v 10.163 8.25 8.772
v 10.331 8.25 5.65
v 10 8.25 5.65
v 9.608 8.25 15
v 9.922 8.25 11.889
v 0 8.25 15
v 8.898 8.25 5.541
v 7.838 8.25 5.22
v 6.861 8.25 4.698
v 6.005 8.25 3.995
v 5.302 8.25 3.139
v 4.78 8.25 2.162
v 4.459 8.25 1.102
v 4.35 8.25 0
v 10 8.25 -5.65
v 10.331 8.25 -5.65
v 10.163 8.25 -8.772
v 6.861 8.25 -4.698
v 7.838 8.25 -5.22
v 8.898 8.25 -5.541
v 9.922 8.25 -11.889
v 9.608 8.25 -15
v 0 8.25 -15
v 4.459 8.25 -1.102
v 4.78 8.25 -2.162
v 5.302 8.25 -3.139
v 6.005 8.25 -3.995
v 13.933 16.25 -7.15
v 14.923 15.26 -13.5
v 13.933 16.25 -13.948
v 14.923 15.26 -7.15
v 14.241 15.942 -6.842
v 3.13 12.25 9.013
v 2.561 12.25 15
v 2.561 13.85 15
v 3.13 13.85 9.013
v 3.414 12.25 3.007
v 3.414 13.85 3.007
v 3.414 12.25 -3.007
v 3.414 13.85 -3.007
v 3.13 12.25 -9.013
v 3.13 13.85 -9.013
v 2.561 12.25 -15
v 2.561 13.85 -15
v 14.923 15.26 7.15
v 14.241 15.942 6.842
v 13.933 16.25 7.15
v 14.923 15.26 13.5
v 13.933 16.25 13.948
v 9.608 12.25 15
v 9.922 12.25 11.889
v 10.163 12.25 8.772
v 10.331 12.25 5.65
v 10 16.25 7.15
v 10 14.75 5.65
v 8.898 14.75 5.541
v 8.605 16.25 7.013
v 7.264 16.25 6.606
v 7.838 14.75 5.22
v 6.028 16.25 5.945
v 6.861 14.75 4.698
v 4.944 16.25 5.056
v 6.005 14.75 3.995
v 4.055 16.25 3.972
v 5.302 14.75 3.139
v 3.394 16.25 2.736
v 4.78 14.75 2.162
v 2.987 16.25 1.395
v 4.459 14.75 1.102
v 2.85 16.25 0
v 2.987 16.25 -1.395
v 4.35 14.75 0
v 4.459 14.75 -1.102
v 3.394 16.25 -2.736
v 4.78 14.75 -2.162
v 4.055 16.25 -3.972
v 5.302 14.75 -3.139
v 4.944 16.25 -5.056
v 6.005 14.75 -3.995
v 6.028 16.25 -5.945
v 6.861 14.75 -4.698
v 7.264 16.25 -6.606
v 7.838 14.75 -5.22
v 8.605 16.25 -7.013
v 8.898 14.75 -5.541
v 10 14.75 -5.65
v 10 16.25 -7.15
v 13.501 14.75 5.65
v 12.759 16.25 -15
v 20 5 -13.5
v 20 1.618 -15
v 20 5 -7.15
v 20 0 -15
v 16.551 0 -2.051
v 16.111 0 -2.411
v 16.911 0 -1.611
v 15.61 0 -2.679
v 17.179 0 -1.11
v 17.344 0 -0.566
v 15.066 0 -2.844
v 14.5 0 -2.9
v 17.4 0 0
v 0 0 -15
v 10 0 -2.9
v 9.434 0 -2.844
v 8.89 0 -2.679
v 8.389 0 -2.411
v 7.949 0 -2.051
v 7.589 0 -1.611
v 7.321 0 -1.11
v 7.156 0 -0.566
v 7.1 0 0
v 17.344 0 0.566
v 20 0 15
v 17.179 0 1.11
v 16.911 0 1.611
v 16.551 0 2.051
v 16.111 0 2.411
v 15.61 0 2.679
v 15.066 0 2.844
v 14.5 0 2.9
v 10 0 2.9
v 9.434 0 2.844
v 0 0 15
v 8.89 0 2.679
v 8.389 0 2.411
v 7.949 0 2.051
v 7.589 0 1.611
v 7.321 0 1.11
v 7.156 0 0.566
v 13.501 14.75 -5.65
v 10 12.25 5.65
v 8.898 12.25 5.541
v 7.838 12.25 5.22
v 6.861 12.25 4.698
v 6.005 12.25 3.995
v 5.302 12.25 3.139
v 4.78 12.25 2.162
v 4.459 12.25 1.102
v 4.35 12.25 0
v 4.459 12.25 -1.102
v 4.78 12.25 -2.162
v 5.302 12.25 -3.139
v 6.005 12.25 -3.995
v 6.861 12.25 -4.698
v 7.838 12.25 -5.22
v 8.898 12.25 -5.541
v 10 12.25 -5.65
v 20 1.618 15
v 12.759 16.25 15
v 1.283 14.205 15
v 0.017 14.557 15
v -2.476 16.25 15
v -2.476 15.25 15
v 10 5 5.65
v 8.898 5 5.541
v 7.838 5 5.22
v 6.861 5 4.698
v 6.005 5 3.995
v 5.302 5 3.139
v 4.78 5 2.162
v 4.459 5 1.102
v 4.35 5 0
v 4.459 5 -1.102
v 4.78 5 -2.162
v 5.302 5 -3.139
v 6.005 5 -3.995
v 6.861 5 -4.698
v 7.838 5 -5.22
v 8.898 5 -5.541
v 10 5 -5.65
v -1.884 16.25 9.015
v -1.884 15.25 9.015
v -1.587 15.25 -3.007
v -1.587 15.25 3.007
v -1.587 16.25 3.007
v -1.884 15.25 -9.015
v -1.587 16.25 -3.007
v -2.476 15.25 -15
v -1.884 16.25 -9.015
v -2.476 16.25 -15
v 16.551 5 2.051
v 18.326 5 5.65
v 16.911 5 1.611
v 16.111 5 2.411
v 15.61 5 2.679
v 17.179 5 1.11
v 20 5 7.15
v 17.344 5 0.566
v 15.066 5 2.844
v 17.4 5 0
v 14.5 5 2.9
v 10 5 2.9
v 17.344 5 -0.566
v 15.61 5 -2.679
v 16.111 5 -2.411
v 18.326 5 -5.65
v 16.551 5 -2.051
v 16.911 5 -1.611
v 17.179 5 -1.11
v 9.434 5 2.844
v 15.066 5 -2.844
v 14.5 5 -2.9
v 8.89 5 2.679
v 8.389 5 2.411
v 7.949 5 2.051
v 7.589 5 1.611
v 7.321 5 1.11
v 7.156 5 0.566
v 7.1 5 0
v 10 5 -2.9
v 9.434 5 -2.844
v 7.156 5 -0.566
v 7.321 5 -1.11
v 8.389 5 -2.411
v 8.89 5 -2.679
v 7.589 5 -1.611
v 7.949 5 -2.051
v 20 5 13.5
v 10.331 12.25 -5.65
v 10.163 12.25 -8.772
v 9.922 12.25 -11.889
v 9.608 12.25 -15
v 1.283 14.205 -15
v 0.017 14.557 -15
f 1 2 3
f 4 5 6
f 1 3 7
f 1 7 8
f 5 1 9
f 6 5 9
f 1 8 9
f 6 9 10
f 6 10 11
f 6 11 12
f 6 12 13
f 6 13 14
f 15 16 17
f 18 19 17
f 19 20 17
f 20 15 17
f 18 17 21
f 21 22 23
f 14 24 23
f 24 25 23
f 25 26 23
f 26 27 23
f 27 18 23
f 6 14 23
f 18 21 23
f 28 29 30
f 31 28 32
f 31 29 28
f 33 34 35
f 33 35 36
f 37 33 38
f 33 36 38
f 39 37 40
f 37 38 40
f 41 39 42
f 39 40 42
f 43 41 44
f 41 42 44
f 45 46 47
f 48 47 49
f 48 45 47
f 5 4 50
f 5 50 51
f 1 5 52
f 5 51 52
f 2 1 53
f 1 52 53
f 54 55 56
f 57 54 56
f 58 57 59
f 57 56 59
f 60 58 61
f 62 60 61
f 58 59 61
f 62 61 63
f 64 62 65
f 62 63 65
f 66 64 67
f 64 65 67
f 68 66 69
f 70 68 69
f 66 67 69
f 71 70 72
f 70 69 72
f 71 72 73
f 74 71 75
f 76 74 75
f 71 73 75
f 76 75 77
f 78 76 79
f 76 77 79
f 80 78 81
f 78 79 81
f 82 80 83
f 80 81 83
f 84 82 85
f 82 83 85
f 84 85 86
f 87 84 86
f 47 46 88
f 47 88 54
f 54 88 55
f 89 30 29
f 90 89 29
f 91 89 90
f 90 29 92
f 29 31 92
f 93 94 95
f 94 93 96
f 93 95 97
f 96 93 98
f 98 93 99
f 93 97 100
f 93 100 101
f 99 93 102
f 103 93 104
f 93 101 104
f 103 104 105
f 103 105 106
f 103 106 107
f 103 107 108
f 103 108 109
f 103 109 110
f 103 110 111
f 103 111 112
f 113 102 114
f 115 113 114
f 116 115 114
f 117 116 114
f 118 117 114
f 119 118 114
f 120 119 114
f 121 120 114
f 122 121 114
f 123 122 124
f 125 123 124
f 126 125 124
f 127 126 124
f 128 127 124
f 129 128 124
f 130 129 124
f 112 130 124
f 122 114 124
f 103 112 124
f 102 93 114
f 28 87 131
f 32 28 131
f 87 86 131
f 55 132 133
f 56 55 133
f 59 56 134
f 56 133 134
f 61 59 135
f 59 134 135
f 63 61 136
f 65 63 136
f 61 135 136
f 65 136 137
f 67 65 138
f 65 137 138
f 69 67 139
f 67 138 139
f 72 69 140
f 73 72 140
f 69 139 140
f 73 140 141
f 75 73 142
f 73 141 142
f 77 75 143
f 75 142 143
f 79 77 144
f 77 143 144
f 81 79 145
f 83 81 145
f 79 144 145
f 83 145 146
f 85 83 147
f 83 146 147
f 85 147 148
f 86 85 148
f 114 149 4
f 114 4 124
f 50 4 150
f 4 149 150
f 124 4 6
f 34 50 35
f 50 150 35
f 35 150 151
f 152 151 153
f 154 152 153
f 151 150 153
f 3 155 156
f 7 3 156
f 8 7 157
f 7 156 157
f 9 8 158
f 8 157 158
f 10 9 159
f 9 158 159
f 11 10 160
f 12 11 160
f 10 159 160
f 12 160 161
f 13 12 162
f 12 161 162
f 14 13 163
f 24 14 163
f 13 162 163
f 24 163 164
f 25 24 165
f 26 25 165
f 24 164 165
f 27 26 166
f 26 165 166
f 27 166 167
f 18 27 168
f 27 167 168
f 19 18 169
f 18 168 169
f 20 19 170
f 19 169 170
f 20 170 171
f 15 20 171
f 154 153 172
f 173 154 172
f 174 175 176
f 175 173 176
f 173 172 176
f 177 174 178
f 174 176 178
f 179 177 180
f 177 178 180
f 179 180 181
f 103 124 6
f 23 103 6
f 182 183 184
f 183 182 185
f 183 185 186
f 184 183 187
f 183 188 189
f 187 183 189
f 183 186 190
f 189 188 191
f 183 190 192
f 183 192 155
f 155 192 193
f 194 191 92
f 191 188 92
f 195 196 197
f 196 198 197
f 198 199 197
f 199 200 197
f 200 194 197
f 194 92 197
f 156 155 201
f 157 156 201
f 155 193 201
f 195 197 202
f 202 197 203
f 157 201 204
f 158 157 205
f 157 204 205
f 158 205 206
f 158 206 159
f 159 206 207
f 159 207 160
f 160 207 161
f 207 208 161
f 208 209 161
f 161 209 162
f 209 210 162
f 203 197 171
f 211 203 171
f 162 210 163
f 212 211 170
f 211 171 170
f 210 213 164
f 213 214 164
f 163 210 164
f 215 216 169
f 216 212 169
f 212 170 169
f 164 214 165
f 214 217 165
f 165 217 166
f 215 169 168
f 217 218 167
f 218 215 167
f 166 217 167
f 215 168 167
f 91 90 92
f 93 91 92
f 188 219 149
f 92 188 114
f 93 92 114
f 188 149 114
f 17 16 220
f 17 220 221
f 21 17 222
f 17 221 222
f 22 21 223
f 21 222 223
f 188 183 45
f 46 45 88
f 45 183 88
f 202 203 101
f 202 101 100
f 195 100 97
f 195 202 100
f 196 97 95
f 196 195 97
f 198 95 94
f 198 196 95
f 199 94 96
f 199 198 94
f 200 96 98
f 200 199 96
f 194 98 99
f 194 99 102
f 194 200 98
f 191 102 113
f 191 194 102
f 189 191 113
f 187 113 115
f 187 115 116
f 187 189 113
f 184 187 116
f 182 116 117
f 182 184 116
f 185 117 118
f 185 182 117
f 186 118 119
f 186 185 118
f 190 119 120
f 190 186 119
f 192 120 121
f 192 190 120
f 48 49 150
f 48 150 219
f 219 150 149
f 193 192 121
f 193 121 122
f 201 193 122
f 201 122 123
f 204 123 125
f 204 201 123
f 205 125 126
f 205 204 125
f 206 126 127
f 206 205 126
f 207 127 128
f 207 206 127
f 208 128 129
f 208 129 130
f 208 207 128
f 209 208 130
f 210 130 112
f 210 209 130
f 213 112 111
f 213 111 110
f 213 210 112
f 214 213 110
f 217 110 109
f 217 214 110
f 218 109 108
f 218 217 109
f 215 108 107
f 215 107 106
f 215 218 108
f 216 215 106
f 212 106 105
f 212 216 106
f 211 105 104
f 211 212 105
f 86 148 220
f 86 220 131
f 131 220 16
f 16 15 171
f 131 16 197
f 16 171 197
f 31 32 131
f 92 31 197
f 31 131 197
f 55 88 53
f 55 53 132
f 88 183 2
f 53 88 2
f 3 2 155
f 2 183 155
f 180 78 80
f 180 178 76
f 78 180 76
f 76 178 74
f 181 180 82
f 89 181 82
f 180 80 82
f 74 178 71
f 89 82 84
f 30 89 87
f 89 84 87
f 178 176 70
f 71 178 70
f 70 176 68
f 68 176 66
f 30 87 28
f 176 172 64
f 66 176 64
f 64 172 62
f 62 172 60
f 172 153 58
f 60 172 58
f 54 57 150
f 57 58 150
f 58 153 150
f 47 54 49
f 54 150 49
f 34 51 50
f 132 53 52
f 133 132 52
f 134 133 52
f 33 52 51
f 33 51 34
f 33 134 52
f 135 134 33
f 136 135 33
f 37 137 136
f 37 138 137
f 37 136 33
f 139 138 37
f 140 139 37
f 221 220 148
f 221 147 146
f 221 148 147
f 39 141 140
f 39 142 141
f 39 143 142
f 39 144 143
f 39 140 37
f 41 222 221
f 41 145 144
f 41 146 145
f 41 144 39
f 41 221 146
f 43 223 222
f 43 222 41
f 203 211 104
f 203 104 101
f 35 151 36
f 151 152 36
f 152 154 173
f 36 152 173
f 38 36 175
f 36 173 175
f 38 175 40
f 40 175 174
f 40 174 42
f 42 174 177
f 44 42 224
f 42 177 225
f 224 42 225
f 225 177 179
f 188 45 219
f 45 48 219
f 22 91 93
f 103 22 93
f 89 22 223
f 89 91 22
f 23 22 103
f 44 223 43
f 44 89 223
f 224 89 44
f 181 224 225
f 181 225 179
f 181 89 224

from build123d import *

# Parameters (mm, degrees)
BOSS_EXTRUDE1_DEPTH      = 15
BOSS_EXTRUDE1_DEPTH_BACK = 15
SKETCH2_W                = 10.45
SKETCH2_H                = 4
CUT_EXTRUDE3_DEPTH       = 28.414640249
CUT_EXTRUDE7_DEPTH       = 5
CHAMFER1_SIZE            = 1.5
CHAMFER2_SIZE            = 0.5
CHAMFER2_SIZE2           = 1.104400541
CHAMFER2_EDGE_2_SIZE     = 0.5
CHAMFER2_EDGE_2_SIZE2    = 1.104400541


with BuildPart() as part:
    # Sketch1 → Boss-Extrude1 (new, two sides)
    with BuildSketch(Plane.XY) as boss_extrude1_sk:
        Polygon((20, 5), (20, 0), (0, 0), (0, 12.25), (-5.154982838, 12.25), (-5.154982838, 16.25), (14.432786844, 16.25), align=None)
    extrude(amount=BOSS_EXTRUDE1_DEPTH)
    extrude(boss_extrude1_sk.sketch, amount=-BOSS_EXTRUDE1_DEPTH_BACK)

    # Sketch2 → Cut-Revolve2 (revolve, cut)
    with BuildSketch(Plane.XY):
        with Locations((5.225, 10.25)):
            Rectangle(SKETCH2_W, SKETCH2_H)
        Polygon((-1.55, 16.25), (-5.154982838, 16.25), (-5.154982838, 12.25), (0, 12.25), (3.45, 12.25), (3.45, 13.85), (-1.55, 15.25), align=None)
    revolve(axis=Axis((-123.55, 0, 0), (0, 1, 0)), mode=Mode.SUBTRACT)

    # Sketch5 → Cut-Extrude3 (cut, through all)
    with BuildSketch(Plane(origin=(0, 5, 0), x_dir=(-1, 0, 0), z_dir=(0, -1, 0))):
        with BuildLine():
            Line((-20, -5.65), (-10, -5.65))
            ThreePointArc((-10, -5.65), (-4.35, 0), (-10, 5.65))
            Line((-10, 5.65), (-20, 5.65))
            Line((-20, 5.65), (-20, -5.65))
        make_face()
    extrude(amount=-CUT_EXTRUDE3_DEPTH, mode=Mode.SUBTRACT)

    # Sketch6 → Cut-Extrude7 (cut)
    with BuildSketch(Plane(origin=(0, 5, 0), x_dir=(1, 0, 0), z_dir=(0, 1, 0))):
        with BuildLine():
            Line((10, 2.9), (14.5, 2.9))
            ThreePointArc((14.5, 2.9), (17.4, 0), (14.5, -2.9))
            Line((14.5, -2.9), (10, -2.9))
            ThreePointArc((10, -2.9), (7.1, 0), (10, 2.9))
        make_face()
    extrude(amount=-CUT_EXTRUDE7_DEPTH, mode=Mode.SUBTRACT)

    # Chamfer1
    chamfer1_edges = [part.edges().sort_by_distance(p)[0] for p in [
        (17.216393422, 10.625, 15),
        (12.216393422, 16.25, -5.65),
        (12.216393422, 16.25, 5.65),
        (17.216393422, 10.625, 5.65),
        (17.216393422, 10.625, -5.65),
        (4.35, 16.25, 0),
        (17.216393422, 10.625, -15),
    ]]
    chamfer(chamfer1_edges, length=CHAMFER1_SIZE)

    # Chamfer2
    chamfer2_edges = [part.edges().sort_by_distance(p)[0] for p in [
        (14.432786844, 16.25, -10.325),
    ]]
    chamfer2_side = [part.faces().sort_by_distance(p)[0] for p in [
        (5.141762366, 16.25, -14.655631739),
    ]]
    chamfer(chamfer2_edges, length=CHAMFER2_SIZE, length2=CHAMFER2_SIZE2, reference=chamfer2_side[0])

    # Chamfer2 edge 2
    chamfer2_edge_2_edges = [part.edges().sort_by_distance(p)[0] for p in [
        (14.432786844, 16.25, 10.325),
    ]]
    chamfer2_edge_2_side = [part.faces().sort_by_distance(p)[0] for p in [
        (5.141762366, 16.25, -14.655631739),
    ]]
    chamfer(chamfer2_edge_2_edges, length=CHAMFER2_EDGE_2_SIZE, length2=CHAMFER2_EDGE_2_SIZE2, reference=chamfer2_edge_2_side[0])


solid = part.part
